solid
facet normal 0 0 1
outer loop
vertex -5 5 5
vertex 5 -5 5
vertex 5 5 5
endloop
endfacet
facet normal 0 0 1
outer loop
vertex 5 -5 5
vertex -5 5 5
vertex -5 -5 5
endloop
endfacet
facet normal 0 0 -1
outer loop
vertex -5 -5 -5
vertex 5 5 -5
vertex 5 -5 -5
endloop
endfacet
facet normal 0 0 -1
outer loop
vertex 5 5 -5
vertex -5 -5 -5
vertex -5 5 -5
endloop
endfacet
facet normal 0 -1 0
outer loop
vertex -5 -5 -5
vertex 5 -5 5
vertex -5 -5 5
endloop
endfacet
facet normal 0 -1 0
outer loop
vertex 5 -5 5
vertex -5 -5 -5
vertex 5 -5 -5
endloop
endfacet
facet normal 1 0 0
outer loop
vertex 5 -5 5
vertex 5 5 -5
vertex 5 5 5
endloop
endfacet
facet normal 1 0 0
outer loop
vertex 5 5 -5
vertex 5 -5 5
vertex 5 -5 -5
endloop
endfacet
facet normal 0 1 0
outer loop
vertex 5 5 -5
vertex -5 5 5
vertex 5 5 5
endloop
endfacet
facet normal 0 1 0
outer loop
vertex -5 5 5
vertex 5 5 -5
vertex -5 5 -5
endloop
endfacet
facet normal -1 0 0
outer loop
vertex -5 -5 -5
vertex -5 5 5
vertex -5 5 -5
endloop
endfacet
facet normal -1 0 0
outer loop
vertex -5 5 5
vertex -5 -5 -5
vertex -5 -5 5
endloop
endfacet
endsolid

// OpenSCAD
// Unit of length: Unit.MM
cube(size = 10.0, center = true);
